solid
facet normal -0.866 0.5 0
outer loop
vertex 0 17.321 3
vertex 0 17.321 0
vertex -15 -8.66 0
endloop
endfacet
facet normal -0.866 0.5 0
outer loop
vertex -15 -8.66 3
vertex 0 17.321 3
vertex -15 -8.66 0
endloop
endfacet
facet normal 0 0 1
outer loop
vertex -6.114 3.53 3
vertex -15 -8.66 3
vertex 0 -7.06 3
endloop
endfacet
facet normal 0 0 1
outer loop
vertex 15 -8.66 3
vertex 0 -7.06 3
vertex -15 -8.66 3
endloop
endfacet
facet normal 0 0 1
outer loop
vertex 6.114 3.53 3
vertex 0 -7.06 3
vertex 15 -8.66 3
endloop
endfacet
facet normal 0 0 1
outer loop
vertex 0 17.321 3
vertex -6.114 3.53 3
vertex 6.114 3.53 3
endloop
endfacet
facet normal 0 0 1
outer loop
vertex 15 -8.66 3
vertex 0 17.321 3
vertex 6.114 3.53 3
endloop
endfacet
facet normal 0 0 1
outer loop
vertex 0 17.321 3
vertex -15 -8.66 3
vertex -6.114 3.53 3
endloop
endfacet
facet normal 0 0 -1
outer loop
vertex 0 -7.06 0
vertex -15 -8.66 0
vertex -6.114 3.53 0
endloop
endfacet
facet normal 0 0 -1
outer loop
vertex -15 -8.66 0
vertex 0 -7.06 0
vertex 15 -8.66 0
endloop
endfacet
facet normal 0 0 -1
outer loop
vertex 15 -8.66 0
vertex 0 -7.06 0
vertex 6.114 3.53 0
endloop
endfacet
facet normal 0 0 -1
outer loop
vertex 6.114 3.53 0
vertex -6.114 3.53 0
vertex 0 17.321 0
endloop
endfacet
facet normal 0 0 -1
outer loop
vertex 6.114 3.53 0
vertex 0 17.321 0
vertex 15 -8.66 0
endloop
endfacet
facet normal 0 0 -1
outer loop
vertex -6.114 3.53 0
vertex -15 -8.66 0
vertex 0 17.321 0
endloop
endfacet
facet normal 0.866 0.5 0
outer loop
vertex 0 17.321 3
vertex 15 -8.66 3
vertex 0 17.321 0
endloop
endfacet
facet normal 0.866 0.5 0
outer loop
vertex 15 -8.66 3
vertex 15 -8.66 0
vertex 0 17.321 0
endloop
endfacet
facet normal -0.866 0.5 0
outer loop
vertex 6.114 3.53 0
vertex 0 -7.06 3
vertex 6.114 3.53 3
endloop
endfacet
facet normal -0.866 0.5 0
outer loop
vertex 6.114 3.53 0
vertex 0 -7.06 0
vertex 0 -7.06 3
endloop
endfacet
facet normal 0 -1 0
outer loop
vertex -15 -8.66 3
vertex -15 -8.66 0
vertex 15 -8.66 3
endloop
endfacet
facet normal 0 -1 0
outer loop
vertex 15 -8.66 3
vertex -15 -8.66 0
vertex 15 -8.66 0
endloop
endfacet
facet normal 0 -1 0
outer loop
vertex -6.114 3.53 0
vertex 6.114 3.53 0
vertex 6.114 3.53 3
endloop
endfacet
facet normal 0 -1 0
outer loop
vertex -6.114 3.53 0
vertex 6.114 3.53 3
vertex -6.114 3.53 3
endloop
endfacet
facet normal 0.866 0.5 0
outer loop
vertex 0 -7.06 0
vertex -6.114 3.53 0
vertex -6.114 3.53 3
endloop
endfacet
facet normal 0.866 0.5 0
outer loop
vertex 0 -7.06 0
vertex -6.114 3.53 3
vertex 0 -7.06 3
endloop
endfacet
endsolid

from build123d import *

# Parameters (mm, degrees)
F1_DEPTH = 1.5
F4_DEPTH = 1.5
F5_DEPTH = 1.5


with BuildPart() as f1:
    # F0 (on Top) → F1 (new body)
    with BuildSketch(Plane.XY):
        Polygon((-15, -8.6602540378), (15, -8.6602540378), (0, 17.3205080757), align=None)
    extrude(amount=F1_DEPTH)

    # F3 (on face) → F4 (cut)
    with BuildSketch(Plane.XY.offset(1.5)):
        Polygon((0, -7.0602540378), (6.1143593539, 3.5301270189), (-6.1143593539, 3.5301270189), align=None)
    extrude(amount=-F4_DEPTH, mode=Mode.SUBTRACT)

    # F5 (add): a face of the model
    f5_faces = [f1.faces().sort_by_distance(p)[0] for p in [
        (-7.1563068229, 4.1316956706, 1.5),
    ]]
    extrude(f5_faces, amount=F5_DEPTH)


solid = f1.part
